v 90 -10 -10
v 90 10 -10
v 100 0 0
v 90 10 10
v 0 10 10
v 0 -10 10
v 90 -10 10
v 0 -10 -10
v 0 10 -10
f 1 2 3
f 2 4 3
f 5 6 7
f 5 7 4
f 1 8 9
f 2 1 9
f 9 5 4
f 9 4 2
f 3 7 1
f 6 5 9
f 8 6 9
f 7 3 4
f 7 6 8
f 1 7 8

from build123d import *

# Parameters (mm, degrees)
SKETCH_1_W          = 20
SKETCH_1_H          = 20
EXTRUDE_1_DEPTH     = 100
CUT_EXTRUDE_1_DEPTH = 34
CUT_EXTRUDE_2_DEPTH = 34
CUT_EXTRUDE_3_DEPTH = 34


with BuildPart() as part:
    # 草图1 → 凸台-拉伸1 (new body)
    with BuildSketch(Plane(origin=(0, 0, 0), x_dir=(0, 0, -1), z_dir=(1, 0, 0))):
        Rectangle(SKETCH_1_W, SKETCH_1_H)
    extrude(amount=EXTRUDE_1_DEPTH)

    # 草图2 → 切除-拉伸1 (cut)
    with BuildSketch(Plane.XY.offset(10)):
        Polygon((100, 10), (90, 10), (100, 0), align=None)
    extrude(amount=-CUT_EXTRUDE_1_DEPTH, mode=Mode.SUBTRACT)

    # 草图3 → 切除-拉伸2 (cut)
    with BuildSketch(Plane.XY.offset(10)):
        Polygon((100, 0), (100, -10), (90, -10), align=None)
    extrude(amount=-CUT_EXTRUDE_2_DEPTH, mode=Mode.SUBTRACT)

    # 草图4 → 切除-拉伸3 (cut)
    with BuildSketch(Plane(origin=(0, 10, 0), x_dir=(1, 0, 0), z_dir=(0, 1, 0))):
        Polygon((100, 10), (90, 10), (100, 0), align=None)
        Polygon((90, -10), (100, -10), (100, 0), align=None)
    extrude(amount=-CUT_EXTRUDE_3_DEPTH, mode=Mode.SUBTRACT)


solid = part.part
